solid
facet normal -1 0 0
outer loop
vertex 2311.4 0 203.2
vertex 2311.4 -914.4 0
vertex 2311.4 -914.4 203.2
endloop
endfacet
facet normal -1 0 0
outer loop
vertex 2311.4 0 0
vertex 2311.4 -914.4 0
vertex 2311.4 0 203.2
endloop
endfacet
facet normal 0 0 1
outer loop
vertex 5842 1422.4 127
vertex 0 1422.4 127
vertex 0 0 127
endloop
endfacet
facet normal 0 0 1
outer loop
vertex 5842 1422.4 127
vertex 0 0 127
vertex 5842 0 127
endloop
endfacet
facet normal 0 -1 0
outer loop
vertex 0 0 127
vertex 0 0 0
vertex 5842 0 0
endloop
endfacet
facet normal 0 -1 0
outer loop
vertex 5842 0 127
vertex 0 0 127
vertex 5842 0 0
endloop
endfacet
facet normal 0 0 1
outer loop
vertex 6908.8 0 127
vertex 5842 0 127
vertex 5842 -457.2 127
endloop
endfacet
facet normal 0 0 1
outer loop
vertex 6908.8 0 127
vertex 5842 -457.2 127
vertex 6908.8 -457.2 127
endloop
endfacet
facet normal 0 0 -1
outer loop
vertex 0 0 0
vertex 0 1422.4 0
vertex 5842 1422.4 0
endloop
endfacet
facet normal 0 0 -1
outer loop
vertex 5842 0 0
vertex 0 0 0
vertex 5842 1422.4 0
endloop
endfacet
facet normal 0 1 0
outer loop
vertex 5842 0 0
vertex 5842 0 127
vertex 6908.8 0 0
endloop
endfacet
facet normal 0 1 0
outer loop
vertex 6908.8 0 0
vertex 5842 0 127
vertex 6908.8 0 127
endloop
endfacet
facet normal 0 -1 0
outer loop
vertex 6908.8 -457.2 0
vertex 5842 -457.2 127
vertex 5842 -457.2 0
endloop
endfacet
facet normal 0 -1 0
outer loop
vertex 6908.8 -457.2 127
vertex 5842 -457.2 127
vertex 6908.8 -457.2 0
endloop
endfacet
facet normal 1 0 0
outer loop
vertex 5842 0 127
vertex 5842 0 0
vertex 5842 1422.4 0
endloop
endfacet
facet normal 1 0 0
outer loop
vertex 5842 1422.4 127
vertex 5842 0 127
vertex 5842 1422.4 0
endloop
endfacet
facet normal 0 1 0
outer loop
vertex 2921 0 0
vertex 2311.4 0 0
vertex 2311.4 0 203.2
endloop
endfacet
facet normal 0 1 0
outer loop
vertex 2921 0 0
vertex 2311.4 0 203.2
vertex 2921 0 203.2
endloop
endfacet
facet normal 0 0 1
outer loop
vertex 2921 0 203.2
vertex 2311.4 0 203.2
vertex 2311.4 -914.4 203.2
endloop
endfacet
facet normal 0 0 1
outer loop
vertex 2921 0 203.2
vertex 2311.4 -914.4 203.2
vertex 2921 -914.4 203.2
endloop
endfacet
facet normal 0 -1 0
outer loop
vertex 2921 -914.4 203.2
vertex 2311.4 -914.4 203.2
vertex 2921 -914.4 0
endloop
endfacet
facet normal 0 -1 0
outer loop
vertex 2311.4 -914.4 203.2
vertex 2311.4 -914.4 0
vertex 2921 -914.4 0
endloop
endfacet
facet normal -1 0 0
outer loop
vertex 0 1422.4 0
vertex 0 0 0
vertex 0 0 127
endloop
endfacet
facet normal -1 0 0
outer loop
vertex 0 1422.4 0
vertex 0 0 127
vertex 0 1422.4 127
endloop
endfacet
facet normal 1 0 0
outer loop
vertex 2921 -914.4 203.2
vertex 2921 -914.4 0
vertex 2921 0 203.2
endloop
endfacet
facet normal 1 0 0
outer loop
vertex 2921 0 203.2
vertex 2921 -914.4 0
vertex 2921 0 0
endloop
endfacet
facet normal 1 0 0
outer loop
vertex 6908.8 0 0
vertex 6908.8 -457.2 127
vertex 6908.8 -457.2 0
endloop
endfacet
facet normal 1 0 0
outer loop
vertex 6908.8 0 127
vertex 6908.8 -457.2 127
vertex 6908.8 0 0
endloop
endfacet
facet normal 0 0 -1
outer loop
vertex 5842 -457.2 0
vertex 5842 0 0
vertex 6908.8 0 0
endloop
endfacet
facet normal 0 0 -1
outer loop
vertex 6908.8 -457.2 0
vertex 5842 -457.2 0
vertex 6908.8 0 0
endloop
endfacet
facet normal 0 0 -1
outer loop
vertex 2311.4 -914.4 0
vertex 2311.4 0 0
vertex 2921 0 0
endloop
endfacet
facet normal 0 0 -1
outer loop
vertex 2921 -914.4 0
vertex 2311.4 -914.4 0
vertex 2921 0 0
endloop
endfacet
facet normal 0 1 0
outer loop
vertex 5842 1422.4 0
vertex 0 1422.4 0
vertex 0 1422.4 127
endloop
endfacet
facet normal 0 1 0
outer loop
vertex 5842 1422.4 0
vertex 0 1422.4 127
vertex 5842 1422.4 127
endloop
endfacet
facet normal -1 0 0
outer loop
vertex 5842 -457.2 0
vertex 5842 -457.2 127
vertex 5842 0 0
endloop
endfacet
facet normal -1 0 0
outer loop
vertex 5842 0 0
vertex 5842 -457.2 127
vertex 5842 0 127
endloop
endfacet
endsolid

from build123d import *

# Parameters (mm, degrees)
F0_W          = 5842
F0_H          = 1422.4
F1_DEPTH      = 127
F2_W          = 609.6
F2_H          = 914.4
F3_DEPTH      = 127
F3_DEPTH_BACK = 76.2
F4_W          = 1066.8
F4_H          = 457.2
F5_DEPTH      = 127


with BuildPart() as f1:
    # F0 (on Top) → F1 (new body)
    with BuildSketch(Plane.XY):
        with Locations((2921, 711.2)):
            Rectangle(F0_W, F0_H)
    extrude(amount=F1_DEPTH)


with BuildPart() as f3:
    # F2 (on face) → F3 (new body, two sides)
    with BuildSketch(Plane.XY.offset(127)) as f3_sk:
        with Locations((2616.2, -457.2)):
            Rectangle(F2_W, F2_H)
    extrude(amount=-F3_DEPTH)
    extrude(f3_sk.sketch, amount=F3_DEPTH_BACK)


with BuildPart() as f5:
    # F4 (on face) → F5 (new body)
    with BuildSketch(Plane.XY.offset(127)):
        with Locations((6375.4, -228.6)):
            Rectangle(F4_W, F4_H)
    extrude(amount=-F5_DEPTH)


solid = Compound([f1.part, f3.part, f5.part])
